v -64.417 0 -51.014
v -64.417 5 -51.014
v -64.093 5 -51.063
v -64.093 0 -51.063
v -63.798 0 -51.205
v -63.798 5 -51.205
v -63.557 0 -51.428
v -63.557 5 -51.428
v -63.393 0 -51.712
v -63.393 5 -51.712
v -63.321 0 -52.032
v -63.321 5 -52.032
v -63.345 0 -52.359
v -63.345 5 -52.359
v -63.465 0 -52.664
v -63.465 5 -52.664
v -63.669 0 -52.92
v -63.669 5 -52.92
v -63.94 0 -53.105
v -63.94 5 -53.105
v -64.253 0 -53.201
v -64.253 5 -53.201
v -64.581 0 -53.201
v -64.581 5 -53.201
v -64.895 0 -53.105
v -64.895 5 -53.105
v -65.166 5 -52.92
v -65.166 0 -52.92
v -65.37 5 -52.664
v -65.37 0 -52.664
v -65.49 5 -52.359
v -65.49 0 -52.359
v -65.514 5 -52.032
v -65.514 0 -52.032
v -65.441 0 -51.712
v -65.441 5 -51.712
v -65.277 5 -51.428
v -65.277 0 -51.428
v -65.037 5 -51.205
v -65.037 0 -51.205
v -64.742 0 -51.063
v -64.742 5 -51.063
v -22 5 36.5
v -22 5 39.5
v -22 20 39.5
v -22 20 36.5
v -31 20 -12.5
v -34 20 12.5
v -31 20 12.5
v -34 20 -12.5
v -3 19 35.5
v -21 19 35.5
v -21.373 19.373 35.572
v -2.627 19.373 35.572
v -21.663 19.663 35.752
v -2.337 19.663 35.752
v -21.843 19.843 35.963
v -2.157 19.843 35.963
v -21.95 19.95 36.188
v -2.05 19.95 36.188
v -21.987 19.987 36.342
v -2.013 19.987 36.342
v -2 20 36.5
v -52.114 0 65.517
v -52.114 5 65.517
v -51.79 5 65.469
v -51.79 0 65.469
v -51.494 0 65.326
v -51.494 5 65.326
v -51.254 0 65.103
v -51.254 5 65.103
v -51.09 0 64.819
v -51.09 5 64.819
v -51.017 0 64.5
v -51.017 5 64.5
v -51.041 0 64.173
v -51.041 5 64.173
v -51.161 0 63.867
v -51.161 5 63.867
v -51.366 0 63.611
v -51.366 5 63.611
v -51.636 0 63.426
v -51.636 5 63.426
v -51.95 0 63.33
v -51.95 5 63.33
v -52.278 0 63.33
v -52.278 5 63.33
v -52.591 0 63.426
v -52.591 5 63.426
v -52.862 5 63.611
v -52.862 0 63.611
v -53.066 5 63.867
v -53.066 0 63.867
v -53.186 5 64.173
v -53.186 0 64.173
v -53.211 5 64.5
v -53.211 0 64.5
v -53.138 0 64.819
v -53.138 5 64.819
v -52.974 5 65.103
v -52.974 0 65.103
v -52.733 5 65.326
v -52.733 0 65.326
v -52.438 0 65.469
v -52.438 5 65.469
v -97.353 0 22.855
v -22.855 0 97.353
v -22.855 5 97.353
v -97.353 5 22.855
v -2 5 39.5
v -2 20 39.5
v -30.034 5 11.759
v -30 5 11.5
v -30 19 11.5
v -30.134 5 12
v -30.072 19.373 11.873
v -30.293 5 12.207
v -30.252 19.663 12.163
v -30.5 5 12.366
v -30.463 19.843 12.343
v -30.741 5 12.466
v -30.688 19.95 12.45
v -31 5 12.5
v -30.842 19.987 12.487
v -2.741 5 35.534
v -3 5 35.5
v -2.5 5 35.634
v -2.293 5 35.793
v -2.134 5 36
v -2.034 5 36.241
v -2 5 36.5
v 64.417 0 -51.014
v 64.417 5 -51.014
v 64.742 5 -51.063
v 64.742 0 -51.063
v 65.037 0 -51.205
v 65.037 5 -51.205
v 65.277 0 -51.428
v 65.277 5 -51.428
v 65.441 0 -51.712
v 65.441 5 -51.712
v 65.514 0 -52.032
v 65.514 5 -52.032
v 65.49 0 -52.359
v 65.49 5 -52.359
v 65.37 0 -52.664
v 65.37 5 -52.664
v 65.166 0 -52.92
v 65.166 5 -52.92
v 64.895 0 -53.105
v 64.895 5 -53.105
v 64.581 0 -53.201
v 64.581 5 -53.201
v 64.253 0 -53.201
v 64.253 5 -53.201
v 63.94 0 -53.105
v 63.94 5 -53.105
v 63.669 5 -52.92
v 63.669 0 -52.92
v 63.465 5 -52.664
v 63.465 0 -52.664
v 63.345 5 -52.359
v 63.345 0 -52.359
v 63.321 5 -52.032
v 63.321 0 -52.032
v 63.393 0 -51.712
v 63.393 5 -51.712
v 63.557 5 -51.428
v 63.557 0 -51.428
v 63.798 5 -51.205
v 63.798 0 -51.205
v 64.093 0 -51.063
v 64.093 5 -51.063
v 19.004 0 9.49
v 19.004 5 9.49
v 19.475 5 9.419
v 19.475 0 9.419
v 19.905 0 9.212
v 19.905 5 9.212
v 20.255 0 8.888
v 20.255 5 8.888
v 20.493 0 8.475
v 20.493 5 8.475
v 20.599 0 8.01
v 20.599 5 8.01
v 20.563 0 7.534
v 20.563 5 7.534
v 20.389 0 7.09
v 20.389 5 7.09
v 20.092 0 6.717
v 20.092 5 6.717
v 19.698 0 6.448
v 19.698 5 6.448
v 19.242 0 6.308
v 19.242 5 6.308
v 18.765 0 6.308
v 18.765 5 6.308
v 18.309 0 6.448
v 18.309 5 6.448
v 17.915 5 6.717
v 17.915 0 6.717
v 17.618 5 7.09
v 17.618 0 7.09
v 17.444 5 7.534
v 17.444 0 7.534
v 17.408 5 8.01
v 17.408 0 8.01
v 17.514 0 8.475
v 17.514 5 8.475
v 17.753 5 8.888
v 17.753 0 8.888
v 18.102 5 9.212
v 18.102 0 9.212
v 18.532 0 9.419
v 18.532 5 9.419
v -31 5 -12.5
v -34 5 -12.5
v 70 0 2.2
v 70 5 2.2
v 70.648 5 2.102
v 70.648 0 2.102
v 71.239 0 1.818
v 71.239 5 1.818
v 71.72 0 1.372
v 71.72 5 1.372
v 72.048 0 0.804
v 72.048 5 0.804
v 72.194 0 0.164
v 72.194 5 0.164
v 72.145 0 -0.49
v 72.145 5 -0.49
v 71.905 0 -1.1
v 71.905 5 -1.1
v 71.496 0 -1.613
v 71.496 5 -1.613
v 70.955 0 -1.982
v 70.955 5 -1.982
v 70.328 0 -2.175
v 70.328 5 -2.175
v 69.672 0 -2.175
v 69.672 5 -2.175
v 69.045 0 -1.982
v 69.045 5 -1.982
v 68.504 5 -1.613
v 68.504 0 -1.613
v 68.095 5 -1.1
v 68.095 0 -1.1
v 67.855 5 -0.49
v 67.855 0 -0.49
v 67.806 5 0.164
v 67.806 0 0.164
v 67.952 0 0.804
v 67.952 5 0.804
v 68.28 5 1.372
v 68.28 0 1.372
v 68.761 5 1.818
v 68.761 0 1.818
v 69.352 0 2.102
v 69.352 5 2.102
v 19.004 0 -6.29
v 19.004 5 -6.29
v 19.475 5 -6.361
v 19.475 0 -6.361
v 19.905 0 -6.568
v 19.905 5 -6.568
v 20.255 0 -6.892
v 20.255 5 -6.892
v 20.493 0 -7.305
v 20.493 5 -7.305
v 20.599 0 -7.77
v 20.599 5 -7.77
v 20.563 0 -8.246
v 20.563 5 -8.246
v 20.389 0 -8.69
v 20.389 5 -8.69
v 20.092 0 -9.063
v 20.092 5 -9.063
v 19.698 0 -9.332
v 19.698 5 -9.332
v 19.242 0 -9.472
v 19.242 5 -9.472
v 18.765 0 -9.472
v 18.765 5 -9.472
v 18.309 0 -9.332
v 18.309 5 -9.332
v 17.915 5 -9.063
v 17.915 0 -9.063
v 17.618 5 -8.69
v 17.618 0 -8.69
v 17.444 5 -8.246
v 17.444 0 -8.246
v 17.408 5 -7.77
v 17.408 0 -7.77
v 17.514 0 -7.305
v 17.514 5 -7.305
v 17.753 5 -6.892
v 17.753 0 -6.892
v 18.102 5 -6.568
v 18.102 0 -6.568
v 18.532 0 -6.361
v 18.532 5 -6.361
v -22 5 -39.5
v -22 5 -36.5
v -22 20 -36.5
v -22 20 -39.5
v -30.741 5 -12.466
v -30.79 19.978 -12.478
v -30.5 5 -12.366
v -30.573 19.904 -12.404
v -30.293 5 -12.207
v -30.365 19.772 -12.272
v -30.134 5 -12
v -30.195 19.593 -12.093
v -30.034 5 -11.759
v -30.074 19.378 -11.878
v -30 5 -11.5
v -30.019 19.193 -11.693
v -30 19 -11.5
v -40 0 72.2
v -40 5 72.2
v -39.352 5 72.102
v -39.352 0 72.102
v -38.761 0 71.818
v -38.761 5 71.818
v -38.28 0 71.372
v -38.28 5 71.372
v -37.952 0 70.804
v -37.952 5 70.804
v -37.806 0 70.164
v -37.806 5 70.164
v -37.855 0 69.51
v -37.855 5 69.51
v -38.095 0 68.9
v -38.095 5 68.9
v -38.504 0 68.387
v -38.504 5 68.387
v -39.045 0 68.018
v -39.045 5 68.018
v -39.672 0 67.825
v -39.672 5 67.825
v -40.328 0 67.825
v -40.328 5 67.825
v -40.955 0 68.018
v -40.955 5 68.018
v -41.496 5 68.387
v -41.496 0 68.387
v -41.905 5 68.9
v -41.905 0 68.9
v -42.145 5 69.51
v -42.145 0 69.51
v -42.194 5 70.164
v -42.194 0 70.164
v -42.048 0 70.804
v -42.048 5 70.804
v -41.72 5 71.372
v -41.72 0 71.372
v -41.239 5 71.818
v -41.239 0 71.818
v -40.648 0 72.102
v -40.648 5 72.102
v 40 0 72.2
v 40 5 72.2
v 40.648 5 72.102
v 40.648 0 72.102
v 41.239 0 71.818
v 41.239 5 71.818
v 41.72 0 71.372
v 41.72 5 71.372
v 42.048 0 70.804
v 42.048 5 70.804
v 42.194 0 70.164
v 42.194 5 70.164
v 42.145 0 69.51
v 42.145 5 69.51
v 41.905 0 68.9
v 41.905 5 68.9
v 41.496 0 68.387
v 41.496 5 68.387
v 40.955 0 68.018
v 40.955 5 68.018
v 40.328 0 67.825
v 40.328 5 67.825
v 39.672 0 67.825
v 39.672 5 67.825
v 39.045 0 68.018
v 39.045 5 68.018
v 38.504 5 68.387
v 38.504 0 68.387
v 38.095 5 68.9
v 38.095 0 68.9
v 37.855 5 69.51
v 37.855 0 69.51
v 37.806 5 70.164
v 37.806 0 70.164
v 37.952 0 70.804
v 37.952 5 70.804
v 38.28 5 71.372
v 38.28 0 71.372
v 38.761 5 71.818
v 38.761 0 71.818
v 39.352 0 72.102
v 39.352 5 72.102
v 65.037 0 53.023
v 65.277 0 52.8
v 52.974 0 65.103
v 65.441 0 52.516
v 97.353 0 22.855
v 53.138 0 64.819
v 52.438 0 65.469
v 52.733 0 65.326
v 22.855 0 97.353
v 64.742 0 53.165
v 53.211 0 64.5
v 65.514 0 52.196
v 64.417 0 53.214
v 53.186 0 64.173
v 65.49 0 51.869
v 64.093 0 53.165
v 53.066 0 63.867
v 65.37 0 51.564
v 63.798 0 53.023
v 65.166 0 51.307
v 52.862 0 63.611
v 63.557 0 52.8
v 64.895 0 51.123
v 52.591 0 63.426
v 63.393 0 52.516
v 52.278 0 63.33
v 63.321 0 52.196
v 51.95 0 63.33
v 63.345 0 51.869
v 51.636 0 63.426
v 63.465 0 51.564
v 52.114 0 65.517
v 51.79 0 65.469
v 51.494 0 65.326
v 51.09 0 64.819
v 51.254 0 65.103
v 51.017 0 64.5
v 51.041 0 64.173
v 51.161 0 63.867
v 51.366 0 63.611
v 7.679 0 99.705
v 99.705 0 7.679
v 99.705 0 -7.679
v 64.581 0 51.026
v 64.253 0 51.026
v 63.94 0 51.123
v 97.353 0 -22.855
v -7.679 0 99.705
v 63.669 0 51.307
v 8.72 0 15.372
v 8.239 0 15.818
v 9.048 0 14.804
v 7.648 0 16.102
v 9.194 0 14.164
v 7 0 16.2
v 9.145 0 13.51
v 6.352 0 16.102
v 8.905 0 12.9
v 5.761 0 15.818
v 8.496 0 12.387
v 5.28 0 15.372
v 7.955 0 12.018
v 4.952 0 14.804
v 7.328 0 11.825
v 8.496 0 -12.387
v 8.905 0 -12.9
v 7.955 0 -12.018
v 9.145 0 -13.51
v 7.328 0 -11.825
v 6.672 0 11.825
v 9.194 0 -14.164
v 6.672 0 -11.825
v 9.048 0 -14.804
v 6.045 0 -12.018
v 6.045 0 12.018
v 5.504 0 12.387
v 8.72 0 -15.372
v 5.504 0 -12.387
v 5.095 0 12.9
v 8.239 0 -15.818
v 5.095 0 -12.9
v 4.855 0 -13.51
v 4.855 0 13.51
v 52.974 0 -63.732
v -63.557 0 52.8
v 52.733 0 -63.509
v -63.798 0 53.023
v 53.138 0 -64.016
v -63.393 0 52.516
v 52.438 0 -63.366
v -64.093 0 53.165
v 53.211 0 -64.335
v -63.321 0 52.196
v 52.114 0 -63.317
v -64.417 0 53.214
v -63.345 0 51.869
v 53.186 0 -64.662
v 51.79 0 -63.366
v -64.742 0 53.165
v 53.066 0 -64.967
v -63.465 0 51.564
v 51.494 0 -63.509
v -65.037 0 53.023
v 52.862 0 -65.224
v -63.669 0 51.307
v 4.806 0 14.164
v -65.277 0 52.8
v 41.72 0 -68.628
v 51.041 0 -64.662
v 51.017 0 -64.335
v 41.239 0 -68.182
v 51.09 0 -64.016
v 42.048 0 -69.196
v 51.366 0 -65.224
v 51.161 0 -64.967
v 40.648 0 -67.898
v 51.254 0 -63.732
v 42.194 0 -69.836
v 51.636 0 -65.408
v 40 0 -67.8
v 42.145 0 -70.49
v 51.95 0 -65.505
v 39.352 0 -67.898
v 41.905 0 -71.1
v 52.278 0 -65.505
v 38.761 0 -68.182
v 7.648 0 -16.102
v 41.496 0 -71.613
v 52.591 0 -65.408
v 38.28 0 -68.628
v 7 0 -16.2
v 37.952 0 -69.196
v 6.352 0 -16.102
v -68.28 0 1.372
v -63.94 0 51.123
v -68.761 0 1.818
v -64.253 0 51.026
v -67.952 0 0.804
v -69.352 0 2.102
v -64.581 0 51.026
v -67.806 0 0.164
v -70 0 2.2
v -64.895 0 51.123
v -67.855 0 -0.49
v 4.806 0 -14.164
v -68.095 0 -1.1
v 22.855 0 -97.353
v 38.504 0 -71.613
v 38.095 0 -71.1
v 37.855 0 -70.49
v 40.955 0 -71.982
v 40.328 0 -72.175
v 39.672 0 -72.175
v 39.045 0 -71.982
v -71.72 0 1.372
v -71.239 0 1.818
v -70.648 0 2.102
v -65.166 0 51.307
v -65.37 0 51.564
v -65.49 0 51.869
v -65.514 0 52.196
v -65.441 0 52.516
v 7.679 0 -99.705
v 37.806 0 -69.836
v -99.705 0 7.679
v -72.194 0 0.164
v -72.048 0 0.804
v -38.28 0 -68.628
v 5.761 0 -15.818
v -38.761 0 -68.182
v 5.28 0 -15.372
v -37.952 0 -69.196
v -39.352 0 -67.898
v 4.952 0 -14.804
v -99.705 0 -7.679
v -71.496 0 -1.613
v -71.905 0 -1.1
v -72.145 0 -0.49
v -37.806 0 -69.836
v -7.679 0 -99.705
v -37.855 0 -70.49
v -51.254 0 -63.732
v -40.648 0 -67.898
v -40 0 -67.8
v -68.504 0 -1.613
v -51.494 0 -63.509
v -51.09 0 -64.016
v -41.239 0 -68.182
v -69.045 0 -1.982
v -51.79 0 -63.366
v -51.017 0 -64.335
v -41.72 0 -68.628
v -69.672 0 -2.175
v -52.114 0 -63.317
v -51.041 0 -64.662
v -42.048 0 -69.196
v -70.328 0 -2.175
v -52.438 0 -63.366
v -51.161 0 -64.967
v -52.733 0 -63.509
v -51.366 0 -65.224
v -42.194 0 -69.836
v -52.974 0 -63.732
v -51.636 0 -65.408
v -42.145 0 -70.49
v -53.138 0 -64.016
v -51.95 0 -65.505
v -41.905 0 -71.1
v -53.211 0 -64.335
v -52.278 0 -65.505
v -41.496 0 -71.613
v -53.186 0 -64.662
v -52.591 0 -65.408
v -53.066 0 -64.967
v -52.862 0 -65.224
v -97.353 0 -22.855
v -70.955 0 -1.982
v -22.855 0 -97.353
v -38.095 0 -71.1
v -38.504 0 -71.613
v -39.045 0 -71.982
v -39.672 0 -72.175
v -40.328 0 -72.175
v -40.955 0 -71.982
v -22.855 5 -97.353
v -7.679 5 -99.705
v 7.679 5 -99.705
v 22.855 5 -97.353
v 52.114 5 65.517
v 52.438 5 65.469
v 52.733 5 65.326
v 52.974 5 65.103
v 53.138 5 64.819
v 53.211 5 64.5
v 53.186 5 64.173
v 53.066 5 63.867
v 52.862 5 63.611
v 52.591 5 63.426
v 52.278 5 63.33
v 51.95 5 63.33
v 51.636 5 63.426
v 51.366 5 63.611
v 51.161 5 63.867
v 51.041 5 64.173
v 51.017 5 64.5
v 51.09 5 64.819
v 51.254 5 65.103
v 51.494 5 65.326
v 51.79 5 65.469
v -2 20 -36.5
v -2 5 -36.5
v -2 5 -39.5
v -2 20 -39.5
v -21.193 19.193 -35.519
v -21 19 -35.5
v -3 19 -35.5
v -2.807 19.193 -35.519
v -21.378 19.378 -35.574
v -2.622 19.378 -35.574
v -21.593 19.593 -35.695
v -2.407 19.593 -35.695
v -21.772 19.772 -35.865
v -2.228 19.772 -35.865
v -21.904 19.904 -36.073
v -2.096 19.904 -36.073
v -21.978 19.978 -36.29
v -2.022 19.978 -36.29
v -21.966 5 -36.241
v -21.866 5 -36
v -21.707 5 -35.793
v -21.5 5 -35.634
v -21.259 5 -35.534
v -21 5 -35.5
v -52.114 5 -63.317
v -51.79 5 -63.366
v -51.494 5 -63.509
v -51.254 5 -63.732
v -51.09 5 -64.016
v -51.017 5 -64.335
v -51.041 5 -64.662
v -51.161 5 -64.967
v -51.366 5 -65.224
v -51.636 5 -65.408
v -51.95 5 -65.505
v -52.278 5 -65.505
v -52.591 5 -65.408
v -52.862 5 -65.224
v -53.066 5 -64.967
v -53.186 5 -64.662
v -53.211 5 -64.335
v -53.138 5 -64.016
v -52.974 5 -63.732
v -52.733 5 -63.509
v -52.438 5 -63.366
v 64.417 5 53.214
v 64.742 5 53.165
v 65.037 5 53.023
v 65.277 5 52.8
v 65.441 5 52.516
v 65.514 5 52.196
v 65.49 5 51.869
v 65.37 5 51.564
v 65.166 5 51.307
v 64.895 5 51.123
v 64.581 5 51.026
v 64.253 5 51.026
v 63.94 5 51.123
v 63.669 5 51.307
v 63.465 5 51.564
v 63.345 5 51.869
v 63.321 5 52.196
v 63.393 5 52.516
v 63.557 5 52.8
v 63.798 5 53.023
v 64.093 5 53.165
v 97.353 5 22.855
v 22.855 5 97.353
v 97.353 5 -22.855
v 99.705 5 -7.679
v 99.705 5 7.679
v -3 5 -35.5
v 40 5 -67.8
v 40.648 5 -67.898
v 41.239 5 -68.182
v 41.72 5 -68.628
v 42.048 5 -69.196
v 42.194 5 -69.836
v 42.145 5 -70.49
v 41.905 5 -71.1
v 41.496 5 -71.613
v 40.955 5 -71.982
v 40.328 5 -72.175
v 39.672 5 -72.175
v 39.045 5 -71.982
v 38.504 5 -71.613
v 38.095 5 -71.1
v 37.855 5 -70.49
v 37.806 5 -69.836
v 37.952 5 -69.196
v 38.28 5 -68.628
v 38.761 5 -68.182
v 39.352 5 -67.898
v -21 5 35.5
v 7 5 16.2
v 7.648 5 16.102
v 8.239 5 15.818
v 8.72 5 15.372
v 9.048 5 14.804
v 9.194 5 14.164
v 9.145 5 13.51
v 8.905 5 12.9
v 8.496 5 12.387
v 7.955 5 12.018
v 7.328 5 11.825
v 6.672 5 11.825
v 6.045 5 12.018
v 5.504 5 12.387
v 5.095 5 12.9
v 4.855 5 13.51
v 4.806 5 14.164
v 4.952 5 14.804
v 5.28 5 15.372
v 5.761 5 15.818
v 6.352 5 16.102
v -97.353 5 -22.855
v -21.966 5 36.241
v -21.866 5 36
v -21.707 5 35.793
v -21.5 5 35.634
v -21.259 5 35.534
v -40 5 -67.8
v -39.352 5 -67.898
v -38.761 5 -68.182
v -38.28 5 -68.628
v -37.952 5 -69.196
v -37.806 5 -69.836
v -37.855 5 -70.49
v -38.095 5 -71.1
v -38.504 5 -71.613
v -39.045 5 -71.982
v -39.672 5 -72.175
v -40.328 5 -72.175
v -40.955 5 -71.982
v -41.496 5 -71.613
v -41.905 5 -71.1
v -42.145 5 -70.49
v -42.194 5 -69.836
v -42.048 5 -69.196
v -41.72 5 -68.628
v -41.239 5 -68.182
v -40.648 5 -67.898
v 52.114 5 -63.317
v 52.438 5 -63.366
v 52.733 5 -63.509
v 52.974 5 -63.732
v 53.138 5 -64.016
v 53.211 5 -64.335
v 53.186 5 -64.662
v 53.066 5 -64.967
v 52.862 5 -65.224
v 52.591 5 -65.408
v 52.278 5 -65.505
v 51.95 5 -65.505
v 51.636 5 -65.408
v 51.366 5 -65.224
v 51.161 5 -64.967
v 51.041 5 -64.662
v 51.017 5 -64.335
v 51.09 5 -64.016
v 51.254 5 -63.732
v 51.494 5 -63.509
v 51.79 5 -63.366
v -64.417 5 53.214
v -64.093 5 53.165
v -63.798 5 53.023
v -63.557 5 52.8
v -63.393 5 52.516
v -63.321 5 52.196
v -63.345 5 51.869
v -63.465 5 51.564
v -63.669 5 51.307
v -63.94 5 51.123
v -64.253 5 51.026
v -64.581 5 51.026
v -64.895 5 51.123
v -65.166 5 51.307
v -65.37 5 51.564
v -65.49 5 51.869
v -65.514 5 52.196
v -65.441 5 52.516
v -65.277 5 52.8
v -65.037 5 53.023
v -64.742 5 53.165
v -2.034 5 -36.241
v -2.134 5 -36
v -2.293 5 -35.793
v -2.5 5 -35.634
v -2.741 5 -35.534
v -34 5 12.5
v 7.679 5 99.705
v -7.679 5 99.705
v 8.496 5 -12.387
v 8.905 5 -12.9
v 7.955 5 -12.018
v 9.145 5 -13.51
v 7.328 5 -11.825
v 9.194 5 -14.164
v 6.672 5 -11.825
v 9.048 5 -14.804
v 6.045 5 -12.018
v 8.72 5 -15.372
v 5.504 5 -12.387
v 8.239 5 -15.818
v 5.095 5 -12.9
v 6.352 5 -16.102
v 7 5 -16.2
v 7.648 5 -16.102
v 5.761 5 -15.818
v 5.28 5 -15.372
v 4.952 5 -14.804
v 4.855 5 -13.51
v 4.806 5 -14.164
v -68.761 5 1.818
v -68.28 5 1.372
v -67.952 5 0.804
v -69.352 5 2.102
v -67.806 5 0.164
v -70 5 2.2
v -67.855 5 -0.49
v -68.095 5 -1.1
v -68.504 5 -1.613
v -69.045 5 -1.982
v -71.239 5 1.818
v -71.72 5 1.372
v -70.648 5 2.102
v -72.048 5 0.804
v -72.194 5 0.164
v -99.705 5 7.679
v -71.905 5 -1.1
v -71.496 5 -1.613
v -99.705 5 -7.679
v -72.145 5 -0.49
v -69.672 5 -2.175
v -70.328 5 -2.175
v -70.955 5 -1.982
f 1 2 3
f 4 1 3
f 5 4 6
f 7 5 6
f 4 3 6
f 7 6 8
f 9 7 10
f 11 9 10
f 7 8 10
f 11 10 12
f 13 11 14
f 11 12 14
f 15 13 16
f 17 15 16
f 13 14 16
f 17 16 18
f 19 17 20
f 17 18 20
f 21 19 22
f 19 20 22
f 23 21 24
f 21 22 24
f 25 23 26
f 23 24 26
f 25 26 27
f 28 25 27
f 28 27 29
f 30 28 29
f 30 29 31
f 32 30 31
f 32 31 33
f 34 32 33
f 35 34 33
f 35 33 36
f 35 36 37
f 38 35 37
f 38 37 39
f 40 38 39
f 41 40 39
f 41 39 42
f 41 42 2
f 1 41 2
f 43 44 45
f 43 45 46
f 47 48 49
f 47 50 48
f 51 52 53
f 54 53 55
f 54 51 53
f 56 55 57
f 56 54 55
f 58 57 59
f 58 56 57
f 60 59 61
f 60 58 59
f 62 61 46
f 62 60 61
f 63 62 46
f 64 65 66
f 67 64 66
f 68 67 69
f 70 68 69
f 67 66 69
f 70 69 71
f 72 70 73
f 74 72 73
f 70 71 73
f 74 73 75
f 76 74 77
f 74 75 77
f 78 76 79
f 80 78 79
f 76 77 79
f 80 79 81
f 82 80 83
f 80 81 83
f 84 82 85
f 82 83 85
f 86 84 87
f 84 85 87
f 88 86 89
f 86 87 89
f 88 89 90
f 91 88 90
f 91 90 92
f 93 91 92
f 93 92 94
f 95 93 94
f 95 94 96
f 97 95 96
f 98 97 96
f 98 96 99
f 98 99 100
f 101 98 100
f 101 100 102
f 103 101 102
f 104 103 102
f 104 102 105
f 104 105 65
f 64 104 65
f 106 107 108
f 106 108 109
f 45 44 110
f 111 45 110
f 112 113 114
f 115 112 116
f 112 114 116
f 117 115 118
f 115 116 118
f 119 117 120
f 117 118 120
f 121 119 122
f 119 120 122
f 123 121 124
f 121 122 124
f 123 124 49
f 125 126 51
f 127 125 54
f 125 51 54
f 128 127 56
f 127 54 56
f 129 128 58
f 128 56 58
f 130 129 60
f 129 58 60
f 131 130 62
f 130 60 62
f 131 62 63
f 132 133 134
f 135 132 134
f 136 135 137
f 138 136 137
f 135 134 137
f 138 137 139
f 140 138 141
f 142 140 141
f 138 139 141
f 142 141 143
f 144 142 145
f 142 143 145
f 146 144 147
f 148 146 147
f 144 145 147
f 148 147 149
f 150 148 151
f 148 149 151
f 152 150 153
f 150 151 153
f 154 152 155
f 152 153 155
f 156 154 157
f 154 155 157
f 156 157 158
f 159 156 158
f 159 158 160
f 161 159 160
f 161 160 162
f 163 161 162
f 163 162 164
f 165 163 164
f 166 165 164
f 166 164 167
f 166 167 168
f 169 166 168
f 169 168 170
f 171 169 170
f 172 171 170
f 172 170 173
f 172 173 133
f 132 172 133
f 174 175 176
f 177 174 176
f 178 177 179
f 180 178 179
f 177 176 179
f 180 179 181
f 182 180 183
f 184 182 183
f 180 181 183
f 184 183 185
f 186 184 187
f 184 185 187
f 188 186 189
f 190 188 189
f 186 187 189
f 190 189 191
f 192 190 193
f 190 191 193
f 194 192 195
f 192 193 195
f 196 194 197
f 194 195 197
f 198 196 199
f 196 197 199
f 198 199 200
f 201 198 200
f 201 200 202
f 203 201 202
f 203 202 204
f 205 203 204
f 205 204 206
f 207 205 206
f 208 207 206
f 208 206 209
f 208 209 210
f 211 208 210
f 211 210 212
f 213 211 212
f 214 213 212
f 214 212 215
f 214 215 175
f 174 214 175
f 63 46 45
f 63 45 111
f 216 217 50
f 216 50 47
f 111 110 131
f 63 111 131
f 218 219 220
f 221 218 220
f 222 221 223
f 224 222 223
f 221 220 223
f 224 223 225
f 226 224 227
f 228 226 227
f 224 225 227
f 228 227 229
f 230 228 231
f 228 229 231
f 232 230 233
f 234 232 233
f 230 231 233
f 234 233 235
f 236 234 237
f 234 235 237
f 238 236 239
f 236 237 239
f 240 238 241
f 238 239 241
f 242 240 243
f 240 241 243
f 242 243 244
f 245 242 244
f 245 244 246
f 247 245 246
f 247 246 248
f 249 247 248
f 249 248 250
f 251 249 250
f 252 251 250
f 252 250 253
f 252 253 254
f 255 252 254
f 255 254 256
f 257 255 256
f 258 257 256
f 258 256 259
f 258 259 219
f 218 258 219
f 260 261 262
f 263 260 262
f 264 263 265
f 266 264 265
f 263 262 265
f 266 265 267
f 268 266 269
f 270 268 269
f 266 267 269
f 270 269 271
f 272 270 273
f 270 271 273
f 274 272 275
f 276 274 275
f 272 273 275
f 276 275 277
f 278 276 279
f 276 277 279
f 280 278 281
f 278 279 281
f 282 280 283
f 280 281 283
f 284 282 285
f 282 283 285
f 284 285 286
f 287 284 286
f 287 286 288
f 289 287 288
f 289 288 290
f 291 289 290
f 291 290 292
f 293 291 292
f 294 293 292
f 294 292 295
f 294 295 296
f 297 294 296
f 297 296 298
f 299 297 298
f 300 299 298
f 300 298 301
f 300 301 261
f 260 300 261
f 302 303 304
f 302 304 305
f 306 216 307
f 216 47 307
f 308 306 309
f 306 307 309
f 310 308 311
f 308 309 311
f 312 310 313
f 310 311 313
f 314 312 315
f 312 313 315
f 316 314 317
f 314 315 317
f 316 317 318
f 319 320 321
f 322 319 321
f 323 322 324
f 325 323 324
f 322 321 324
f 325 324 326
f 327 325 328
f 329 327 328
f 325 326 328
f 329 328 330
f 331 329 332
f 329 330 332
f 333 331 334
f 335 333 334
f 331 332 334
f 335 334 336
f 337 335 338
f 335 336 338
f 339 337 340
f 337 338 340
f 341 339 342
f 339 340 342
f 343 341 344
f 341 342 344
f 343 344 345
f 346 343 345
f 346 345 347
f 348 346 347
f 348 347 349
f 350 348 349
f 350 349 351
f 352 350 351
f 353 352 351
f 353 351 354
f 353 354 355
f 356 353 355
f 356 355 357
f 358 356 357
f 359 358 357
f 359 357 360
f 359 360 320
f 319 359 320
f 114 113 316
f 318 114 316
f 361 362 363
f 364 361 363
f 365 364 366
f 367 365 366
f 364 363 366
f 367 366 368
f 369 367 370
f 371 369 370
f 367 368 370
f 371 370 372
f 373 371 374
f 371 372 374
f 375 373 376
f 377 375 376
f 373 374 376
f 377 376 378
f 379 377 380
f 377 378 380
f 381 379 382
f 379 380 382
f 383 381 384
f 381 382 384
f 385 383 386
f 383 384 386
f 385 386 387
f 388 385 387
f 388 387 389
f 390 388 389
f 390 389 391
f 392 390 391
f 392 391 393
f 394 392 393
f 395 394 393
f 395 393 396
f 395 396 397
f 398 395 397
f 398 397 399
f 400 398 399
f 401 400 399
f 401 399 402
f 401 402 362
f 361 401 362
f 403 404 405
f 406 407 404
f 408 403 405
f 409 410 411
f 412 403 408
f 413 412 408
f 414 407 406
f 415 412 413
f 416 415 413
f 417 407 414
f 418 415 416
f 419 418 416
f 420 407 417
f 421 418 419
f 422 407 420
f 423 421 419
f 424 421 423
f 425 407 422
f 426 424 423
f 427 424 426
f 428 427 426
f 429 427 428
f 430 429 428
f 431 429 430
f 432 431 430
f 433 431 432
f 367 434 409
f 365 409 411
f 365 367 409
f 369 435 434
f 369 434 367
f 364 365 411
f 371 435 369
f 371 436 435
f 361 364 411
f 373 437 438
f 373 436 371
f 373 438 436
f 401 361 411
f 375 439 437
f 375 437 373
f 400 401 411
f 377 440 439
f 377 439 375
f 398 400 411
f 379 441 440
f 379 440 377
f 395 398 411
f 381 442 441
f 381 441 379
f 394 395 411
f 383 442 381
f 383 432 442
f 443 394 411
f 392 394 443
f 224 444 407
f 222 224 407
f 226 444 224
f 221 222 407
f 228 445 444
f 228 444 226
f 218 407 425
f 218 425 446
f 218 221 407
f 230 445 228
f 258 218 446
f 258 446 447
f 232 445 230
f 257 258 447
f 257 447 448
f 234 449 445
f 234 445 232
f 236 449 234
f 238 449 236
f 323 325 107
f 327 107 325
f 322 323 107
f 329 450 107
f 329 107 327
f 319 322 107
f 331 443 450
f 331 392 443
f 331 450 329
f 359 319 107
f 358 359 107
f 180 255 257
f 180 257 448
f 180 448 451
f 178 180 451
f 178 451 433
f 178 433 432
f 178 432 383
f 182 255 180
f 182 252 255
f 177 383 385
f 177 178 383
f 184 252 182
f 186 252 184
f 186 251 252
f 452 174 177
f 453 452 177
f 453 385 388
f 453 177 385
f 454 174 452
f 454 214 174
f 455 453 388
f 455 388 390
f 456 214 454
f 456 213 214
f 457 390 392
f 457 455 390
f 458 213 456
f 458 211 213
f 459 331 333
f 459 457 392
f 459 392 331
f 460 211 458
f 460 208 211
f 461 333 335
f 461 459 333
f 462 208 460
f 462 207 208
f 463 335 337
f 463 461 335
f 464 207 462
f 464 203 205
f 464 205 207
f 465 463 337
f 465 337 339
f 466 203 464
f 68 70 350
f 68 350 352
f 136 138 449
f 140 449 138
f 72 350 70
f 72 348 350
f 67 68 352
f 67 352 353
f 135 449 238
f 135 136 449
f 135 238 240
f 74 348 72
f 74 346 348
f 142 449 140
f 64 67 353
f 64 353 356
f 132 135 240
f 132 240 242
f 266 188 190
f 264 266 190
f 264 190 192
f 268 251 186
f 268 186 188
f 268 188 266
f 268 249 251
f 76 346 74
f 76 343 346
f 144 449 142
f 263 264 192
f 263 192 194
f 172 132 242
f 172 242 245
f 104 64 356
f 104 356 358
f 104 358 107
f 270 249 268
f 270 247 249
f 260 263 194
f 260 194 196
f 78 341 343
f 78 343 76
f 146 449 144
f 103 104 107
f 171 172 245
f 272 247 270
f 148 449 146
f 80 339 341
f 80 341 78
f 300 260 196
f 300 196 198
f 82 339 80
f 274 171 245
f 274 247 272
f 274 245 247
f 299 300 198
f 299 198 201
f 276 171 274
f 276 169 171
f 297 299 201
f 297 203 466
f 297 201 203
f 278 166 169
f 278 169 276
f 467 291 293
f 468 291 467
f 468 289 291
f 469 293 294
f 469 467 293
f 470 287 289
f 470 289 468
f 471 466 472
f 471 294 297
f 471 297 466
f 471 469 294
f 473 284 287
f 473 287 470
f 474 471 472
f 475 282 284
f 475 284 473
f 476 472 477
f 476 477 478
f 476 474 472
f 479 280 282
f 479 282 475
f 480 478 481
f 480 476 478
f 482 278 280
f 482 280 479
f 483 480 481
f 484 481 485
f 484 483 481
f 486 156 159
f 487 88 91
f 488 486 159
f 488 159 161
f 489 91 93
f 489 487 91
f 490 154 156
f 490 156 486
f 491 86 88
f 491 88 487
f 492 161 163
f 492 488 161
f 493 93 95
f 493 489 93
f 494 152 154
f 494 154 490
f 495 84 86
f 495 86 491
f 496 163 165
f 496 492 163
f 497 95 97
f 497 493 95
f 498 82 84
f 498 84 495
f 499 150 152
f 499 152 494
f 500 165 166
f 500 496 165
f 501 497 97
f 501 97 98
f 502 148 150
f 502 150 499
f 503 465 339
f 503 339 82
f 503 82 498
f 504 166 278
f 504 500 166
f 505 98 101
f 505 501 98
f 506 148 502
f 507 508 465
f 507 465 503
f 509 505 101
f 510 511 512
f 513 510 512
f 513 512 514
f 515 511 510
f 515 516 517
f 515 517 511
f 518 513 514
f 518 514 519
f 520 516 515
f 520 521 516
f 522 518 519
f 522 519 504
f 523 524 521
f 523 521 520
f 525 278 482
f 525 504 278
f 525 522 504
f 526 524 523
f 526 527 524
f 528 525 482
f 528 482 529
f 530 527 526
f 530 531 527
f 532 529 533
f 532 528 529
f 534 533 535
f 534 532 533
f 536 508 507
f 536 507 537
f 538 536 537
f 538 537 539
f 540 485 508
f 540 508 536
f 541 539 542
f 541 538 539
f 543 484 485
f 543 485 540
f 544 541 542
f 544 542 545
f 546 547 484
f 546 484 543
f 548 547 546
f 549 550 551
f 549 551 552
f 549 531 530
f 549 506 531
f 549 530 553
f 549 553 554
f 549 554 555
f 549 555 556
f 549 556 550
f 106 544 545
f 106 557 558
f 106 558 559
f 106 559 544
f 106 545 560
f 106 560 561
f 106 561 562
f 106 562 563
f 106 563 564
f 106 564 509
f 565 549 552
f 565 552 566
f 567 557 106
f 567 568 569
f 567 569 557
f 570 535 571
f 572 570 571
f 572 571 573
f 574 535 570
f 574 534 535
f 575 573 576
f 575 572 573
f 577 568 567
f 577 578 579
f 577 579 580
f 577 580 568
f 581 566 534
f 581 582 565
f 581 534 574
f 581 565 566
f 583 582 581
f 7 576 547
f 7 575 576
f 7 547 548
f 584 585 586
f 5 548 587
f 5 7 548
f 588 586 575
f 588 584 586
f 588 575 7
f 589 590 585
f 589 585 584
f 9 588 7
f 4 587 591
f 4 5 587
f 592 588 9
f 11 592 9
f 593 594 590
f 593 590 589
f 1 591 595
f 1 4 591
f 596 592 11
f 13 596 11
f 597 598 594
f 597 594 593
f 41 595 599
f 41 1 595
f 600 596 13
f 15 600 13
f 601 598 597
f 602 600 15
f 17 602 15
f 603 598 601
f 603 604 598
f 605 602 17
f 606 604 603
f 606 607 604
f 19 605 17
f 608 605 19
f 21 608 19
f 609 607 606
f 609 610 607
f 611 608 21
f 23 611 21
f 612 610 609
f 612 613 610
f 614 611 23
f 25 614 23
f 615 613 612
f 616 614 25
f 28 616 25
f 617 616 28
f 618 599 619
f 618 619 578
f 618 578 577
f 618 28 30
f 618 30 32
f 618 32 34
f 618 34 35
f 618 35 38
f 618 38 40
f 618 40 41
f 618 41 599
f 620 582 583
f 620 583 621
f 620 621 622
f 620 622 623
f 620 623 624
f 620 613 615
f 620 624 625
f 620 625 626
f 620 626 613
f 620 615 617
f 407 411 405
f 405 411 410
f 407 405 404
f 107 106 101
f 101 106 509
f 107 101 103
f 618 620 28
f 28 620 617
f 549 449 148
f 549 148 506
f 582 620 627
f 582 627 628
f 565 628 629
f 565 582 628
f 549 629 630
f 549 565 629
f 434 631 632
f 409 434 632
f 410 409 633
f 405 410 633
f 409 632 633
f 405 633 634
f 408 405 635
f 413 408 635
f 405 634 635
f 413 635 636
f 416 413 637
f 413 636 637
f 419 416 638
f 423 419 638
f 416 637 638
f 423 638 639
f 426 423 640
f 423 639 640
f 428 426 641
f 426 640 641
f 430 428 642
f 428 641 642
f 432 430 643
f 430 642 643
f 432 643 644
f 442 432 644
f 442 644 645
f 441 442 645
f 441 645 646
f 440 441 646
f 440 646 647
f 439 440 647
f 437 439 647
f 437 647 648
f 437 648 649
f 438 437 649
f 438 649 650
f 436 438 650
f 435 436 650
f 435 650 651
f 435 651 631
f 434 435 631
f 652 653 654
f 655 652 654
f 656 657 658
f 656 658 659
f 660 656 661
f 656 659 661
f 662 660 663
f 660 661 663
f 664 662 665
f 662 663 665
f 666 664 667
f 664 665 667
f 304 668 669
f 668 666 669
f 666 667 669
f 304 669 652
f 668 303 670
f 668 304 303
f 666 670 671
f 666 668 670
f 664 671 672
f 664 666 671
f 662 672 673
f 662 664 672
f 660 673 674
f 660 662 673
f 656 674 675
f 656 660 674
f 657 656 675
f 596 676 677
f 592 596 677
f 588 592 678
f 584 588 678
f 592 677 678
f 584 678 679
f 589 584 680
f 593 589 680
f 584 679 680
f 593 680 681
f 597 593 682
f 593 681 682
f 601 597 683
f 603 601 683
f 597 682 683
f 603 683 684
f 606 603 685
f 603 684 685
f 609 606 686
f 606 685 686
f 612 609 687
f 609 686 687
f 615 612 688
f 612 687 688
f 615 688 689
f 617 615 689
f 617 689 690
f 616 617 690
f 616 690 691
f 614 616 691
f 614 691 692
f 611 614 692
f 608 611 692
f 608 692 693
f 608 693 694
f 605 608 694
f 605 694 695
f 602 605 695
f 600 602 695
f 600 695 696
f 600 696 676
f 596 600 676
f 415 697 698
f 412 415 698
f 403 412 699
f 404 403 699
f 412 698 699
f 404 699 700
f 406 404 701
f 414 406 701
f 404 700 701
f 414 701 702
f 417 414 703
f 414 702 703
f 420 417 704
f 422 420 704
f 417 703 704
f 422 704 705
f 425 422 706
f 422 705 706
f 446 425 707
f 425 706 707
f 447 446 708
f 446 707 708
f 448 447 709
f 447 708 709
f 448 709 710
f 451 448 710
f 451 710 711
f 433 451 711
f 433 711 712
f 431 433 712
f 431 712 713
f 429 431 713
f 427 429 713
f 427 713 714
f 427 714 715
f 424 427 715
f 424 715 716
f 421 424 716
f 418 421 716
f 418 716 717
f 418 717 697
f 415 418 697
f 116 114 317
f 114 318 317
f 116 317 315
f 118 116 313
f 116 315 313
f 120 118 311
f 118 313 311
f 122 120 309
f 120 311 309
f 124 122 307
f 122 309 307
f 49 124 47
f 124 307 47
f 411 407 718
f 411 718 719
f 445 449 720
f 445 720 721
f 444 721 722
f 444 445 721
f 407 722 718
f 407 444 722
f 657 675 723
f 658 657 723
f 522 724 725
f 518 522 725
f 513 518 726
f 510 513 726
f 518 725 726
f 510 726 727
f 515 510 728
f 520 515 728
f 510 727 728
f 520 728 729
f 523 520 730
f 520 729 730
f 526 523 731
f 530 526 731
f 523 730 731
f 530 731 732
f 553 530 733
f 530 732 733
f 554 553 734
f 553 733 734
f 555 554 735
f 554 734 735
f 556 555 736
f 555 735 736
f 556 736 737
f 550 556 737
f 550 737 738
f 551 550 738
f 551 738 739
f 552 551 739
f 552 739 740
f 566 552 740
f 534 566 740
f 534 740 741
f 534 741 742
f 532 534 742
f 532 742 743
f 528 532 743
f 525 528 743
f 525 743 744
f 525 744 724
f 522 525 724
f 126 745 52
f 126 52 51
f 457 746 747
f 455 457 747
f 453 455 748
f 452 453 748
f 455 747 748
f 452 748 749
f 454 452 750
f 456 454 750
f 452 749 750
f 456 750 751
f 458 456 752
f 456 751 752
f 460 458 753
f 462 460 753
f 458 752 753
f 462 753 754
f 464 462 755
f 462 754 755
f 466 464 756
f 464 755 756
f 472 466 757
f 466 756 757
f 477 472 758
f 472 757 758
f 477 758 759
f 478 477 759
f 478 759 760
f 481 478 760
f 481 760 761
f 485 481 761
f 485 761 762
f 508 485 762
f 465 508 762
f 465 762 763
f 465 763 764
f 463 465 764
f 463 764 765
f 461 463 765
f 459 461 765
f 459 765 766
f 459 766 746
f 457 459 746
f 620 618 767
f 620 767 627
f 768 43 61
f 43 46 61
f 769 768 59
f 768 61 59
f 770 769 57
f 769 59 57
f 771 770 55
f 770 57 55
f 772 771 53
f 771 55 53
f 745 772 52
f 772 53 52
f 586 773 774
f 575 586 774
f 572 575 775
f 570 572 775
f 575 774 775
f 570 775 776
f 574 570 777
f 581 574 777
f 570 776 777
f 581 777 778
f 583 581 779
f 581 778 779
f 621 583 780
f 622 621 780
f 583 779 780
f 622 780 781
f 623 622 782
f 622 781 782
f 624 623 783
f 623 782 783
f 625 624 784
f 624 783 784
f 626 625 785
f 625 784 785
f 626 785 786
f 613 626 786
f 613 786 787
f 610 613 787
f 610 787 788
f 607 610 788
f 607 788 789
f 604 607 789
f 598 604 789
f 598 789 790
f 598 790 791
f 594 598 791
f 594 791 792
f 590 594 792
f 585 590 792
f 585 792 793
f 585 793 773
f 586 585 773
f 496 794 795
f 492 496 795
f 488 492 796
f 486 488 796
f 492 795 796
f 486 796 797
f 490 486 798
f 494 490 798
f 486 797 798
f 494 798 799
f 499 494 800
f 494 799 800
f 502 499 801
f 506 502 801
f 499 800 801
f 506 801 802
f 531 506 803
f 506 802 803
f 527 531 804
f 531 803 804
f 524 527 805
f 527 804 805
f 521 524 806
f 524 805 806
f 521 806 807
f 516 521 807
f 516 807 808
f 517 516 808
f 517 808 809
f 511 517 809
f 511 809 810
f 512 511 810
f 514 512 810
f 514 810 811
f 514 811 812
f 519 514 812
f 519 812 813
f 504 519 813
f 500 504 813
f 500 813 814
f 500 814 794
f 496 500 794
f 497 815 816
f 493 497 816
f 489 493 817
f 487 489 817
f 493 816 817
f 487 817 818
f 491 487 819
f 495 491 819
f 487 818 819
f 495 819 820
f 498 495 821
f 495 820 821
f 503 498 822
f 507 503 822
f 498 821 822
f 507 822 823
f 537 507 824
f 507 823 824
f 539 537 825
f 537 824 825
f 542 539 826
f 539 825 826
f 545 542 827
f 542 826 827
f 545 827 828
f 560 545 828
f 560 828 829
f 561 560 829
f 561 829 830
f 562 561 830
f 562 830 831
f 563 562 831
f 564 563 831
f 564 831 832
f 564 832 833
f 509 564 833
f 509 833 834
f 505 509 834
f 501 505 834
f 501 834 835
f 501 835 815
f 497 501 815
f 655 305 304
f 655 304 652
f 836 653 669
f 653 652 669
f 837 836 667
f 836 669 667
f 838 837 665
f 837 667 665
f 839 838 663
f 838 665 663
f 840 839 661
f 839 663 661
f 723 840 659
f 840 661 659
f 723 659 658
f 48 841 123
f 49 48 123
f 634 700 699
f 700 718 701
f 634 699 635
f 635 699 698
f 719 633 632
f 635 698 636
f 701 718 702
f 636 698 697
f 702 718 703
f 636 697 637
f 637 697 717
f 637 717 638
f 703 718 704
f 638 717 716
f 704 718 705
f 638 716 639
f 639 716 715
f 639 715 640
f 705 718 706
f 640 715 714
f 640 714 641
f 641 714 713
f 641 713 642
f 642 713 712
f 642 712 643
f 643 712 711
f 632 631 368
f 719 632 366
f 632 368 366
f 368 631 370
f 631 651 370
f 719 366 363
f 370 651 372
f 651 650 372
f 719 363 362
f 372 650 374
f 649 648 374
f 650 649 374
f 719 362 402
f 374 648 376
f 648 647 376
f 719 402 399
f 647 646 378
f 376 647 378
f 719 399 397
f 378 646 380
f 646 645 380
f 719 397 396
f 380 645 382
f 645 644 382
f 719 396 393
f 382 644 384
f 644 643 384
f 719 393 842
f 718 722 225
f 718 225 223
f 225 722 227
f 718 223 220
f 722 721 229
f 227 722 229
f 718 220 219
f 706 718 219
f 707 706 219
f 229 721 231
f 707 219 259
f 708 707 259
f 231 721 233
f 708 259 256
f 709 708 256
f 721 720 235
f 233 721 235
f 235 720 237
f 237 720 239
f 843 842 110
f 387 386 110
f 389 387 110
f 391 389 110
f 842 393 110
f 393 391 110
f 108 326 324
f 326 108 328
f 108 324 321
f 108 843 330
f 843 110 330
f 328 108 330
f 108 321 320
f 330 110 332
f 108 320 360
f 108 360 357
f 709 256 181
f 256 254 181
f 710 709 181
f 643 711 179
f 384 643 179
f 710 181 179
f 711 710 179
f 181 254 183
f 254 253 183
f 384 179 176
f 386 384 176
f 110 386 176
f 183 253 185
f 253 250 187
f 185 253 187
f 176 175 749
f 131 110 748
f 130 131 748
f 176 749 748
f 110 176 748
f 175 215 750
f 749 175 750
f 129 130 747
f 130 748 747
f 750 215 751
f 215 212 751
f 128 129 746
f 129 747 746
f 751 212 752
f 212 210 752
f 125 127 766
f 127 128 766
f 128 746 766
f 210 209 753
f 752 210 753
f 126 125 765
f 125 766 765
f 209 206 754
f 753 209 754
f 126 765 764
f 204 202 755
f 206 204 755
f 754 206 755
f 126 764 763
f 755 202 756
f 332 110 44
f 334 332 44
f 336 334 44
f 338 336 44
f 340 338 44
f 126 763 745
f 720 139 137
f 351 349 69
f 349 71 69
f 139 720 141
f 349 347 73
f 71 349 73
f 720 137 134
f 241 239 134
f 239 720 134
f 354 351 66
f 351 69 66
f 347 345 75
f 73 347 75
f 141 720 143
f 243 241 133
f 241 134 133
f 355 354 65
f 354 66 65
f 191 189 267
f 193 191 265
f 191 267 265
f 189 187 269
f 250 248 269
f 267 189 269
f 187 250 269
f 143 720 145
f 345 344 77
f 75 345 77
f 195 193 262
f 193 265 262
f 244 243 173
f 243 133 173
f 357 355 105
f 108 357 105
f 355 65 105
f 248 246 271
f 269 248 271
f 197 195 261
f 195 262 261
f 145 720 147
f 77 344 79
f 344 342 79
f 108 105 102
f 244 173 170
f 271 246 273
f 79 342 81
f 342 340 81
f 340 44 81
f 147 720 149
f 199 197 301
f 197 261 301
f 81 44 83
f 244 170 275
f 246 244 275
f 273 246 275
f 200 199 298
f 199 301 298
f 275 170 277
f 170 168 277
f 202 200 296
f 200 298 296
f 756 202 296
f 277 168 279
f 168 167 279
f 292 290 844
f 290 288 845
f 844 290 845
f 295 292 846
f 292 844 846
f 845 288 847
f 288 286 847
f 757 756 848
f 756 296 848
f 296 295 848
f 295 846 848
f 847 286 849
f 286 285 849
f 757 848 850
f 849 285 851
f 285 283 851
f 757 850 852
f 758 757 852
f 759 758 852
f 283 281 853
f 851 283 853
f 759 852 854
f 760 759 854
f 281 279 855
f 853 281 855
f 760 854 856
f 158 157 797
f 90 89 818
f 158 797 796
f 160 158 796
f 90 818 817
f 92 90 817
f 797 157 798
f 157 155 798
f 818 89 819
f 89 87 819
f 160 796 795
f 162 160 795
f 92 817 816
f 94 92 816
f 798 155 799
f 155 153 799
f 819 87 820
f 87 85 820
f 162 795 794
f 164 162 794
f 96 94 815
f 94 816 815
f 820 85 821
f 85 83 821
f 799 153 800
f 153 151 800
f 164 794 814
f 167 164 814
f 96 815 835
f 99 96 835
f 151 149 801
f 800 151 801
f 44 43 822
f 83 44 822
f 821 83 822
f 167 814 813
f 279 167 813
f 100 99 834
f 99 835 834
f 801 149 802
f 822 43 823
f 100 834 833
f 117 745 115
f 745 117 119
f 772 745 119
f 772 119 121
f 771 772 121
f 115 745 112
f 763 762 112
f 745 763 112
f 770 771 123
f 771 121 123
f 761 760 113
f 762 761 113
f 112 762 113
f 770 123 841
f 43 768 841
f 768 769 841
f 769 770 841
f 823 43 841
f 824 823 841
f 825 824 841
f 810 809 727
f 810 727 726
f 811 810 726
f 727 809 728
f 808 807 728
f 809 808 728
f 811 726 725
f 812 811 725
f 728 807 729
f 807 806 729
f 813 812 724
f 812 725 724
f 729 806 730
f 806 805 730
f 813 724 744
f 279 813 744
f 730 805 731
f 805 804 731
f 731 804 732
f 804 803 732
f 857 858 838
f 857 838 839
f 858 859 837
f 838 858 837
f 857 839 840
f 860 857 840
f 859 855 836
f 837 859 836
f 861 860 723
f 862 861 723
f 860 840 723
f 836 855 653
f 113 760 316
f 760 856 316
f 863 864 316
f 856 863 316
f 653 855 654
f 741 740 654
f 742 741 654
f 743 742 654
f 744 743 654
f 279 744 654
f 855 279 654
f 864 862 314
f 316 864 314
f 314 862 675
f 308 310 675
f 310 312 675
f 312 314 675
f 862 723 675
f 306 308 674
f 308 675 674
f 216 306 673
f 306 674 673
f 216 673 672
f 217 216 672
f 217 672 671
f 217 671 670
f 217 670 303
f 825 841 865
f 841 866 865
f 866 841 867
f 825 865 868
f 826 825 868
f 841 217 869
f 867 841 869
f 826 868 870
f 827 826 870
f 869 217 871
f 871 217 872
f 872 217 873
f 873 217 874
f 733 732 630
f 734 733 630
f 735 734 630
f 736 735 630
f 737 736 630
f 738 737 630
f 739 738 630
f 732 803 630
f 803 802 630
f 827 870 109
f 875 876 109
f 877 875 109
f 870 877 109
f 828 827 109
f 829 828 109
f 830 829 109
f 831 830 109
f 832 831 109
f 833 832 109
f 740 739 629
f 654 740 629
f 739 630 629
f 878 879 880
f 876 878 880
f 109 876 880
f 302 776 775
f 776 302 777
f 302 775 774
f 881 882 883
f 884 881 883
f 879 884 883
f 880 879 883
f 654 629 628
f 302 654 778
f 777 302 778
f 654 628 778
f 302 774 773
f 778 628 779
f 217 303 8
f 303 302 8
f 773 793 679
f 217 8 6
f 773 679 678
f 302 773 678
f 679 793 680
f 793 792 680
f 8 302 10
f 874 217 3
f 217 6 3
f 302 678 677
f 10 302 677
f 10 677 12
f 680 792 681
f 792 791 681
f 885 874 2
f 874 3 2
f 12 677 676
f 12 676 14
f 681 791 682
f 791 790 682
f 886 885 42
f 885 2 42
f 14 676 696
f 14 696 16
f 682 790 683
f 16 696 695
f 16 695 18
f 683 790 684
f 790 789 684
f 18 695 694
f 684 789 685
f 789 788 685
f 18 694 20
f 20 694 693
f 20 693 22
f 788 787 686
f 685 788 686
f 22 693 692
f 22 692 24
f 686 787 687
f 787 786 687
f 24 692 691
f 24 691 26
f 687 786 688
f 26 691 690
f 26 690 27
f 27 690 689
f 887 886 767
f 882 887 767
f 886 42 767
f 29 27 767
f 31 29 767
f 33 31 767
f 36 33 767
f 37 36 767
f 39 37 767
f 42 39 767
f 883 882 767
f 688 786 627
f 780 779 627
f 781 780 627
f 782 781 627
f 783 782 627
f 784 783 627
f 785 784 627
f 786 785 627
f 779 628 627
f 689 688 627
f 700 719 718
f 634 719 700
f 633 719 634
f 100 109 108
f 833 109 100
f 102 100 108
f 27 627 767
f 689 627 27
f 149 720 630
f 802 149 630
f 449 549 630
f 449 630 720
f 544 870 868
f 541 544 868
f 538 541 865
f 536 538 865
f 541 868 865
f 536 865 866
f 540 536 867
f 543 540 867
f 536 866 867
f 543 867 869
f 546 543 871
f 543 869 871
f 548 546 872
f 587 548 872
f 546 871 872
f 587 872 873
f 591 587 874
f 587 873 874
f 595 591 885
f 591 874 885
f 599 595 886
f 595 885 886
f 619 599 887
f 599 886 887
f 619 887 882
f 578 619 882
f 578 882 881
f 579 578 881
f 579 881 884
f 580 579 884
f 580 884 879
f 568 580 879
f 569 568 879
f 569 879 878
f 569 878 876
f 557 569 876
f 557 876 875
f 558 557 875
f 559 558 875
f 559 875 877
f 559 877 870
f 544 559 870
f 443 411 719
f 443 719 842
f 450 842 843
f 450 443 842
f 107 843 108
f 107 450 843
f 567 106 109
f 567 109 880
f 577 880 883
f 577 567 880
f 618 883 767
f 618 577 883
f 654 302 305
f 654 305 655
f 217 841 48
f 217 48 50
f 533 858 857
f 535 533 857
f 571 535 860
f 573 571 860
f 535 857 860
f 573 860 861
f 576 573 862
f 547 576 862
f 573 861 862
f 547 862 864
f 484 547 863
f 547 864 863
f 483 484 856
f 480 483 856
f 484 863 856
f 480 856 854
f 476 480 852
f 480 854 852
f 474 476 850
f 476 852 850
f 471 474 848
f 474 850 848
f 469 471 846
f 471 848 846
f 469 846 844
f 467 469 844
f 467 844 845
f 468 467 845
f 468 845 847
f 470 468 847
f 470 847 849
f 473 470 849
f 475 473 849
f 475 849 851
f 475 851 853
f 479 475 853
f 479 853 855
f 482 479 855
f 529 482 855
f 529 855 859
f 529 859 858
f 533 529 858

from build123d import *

# Parameters (mm, degrees)
BOSS_EXTRUDE1_DEPTH = 5
SKETCH2_R           = 2.2
CUT_EXTRUDE1_DEPTH  = 142.509716981
SKETCH3_R           = 1.1
SKETCH3_R_2         = 1.6
CUT_EXTRUDE3_DEPTH  = 142.509716981
SKETCH3_3_W         = 20
SKETCH3_3_H         = 4
SKETCH3_3_W_2       = 4
SKETCH3_3_H_2       = 25
BOSS_EXTRUDE2_DEPTH = 15
FILLET1_R           = 1


with BuildPart() as part:
    # Sketch1 → Boss-Extrude1 (new body)
    with BuildSketch(Plane(origin=(0, 0, 0), x_dir=(1, 0, 0), z_dir=(0, 1, 0))):
        with BuildLine():
            Line((97.353237465, -22.854915336), (22.854915336, -97.353237465))
            ThreePointArc((22.854915336, -97.353237465), (0, -100), (-22.854915336, -97.353237465))
            Line((-22.854915336, -97.353237465), (-97.353237465, -22.854915336))
            ThreePointArc((-97.353237465, -22.854915336), (-100, 0), (-97.353237465, 22.854915336))
            Line((-97.353237465, 22.854915336), (-22.854915336, 97.353237465))
            ThreePointArc((-22.854915336, 97.353237465), (0, 100), (22.854915336, 97.353237465))
            Line((22.854915336, 97.353237465), (97.353237465, 22.854915336))
            ThreePointArc((97.353237465, 22.854915336), (100, 0), (97.353237465, -22.854915336))
        make_face()
    extrude(amount=BOSS_EXTRUDE1_DEPTH)

    # Sketch2 → Cut-Extrude1 (cut, through all)
    with BuildSketch(Plane(origin=(0, 5, 0), x_dir=(1, 0, 0), z_dir=(0, 1, 0))):
        with Locations((-40, -70)):
            Circle(SKETCH2_R)
        with Locations((40, -70)):
            Circle(SKETCH2_R)
        with Locations((40, 70)):
            Circle(SKETCH2_R)
        with Locations((-40, 70)):
            Circle(SKETCH2_R)
        with Locations((-70, 0)):
            Circle(SKETCH2_R)
        with Locations((70, 0)):
            Circle(SKETCH2_R)
        with Locations((7, -14)):
            Circle(SKETCH2_R)
        with Locations((7, 14)):
            Circle(SKETCH2_R)
    extrude(amount=-CUT_EXTRUDE1_DEPTH, mode=Mode.SUBTRACT)

    # Sketch3 → Cut-Extrude3 (cut, through all)
    with BuildSketch(Plane(origin=(0, 5, 0), x_dir=(1, 0, 0), z_dir=(0, 1, 0))):
        with Locations((-52.113769773, 64.417427766)):
            Circle(SKETCH3_R)
        with Locations((-64.417427766, 52.113769773)):
            Circle(SKETCH3_R)
        with Locations((64.417427766, 52.113769773)):
            Circle(SKETCH3_R)
        with Locations((52.113769773, 64.417427766)):
            Circle(SKETCH3_R)
        with Locations((52.113769773, -64.417427766)):
            Circle(SKETCH3_R)
        with Locations((64.417427766, -52.113769773)):
            Circle(SKETCH3_R)
        with Locations((-64.417427766, -52.113769773)):
            Circle(SKETCH3_R)
        with Locations((-52.113769773, -64.417427766)):
            Circle(SKETCH3_R)
        with Locations((19.00358005, 7.89)):
            Circle(SKETCH3_R_2)
        with Locations((19.00358005, -7.89)):
            Circle(SKETCH3_R_2)
    extrude(amount=-CUT_EXTRUDE3_DEPTH, mode=Mode.SUBTRACT)

    # Sketch3<3> → Boss-Extrude2 (add)
    with BuildSketch(Plane(origin=(0, 5, 0), x_dir=(1, 0, 0), z_dir=(0, 1, 0))):
        with Locations((-12, 37.5)):
            Rectangle(SKETCH3_3_W, SKETCH3_3_H)
        with Locations((-32, 0)):
            Rectangle(SKETCH3_3_W_2, SKETCH3_3_H_2)
        with Locations((-12, -37.5)):
            Rectangle(SKETCH3_3_W, SKETCH3_3_H)
    extrude(amount=BOSS_EXTRUDE2_DEPTH)

    # Fillet1
    fillet1_edges = [part.edges().sort_by_distance(p)[0] for p in [
        (-22, 12.5, 35.5),
        (-2, 12.5, -35.5),
        (-12, 20, -35.5),
        (-22, 12.5, -35.5),
        (-2, 12.5, 35.5),
        (-30, 12.5, 12.5),
        (-30, 12.5, -12.5),
        (-12, 20, 35.5),
        (-30, 20, 0),
    ]]
    fillet(fillet1_edges, radius=FILLET1_R)


solid = part.part
